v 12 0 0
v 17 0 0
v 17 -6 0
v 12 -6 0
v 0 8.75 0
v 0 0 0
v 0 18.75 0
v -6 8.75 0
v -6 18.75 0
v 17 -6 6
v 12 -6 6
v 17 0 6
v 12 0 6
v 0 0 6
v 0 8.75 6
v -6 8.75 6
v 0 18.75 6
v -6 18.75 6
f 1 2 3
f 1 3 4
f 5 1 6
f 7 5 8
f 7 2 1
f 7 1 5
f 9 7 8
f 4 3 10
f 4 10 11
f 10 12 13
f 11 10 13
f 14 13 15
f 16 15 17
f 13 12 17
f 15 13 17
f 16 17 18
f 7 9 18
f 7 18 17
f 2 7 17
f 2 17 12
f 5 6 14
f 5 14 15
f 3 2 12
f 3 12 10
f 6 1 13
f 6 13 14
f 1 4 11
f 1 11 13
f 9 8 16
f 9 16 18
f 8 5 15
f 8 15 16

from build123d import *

# Parameters (mm, degrees)
BOSS_EXTRUDE1_DEPTH = 6


with BuildPart() as part:
    # Sketch1 → Boss-Extrude1 (new body)
    with BuildSketch(Plane.XY):
        Polygon((0, 0), (0, 8.75), (-6, 8.75), (-6, 18.75), (0, 18.75), (17, 0), (17, -6), (12, -6), (12, 0), align=None)
    extrude(amount=BOSS_EXTRUDE1_DEPTH)


solid = part.part
